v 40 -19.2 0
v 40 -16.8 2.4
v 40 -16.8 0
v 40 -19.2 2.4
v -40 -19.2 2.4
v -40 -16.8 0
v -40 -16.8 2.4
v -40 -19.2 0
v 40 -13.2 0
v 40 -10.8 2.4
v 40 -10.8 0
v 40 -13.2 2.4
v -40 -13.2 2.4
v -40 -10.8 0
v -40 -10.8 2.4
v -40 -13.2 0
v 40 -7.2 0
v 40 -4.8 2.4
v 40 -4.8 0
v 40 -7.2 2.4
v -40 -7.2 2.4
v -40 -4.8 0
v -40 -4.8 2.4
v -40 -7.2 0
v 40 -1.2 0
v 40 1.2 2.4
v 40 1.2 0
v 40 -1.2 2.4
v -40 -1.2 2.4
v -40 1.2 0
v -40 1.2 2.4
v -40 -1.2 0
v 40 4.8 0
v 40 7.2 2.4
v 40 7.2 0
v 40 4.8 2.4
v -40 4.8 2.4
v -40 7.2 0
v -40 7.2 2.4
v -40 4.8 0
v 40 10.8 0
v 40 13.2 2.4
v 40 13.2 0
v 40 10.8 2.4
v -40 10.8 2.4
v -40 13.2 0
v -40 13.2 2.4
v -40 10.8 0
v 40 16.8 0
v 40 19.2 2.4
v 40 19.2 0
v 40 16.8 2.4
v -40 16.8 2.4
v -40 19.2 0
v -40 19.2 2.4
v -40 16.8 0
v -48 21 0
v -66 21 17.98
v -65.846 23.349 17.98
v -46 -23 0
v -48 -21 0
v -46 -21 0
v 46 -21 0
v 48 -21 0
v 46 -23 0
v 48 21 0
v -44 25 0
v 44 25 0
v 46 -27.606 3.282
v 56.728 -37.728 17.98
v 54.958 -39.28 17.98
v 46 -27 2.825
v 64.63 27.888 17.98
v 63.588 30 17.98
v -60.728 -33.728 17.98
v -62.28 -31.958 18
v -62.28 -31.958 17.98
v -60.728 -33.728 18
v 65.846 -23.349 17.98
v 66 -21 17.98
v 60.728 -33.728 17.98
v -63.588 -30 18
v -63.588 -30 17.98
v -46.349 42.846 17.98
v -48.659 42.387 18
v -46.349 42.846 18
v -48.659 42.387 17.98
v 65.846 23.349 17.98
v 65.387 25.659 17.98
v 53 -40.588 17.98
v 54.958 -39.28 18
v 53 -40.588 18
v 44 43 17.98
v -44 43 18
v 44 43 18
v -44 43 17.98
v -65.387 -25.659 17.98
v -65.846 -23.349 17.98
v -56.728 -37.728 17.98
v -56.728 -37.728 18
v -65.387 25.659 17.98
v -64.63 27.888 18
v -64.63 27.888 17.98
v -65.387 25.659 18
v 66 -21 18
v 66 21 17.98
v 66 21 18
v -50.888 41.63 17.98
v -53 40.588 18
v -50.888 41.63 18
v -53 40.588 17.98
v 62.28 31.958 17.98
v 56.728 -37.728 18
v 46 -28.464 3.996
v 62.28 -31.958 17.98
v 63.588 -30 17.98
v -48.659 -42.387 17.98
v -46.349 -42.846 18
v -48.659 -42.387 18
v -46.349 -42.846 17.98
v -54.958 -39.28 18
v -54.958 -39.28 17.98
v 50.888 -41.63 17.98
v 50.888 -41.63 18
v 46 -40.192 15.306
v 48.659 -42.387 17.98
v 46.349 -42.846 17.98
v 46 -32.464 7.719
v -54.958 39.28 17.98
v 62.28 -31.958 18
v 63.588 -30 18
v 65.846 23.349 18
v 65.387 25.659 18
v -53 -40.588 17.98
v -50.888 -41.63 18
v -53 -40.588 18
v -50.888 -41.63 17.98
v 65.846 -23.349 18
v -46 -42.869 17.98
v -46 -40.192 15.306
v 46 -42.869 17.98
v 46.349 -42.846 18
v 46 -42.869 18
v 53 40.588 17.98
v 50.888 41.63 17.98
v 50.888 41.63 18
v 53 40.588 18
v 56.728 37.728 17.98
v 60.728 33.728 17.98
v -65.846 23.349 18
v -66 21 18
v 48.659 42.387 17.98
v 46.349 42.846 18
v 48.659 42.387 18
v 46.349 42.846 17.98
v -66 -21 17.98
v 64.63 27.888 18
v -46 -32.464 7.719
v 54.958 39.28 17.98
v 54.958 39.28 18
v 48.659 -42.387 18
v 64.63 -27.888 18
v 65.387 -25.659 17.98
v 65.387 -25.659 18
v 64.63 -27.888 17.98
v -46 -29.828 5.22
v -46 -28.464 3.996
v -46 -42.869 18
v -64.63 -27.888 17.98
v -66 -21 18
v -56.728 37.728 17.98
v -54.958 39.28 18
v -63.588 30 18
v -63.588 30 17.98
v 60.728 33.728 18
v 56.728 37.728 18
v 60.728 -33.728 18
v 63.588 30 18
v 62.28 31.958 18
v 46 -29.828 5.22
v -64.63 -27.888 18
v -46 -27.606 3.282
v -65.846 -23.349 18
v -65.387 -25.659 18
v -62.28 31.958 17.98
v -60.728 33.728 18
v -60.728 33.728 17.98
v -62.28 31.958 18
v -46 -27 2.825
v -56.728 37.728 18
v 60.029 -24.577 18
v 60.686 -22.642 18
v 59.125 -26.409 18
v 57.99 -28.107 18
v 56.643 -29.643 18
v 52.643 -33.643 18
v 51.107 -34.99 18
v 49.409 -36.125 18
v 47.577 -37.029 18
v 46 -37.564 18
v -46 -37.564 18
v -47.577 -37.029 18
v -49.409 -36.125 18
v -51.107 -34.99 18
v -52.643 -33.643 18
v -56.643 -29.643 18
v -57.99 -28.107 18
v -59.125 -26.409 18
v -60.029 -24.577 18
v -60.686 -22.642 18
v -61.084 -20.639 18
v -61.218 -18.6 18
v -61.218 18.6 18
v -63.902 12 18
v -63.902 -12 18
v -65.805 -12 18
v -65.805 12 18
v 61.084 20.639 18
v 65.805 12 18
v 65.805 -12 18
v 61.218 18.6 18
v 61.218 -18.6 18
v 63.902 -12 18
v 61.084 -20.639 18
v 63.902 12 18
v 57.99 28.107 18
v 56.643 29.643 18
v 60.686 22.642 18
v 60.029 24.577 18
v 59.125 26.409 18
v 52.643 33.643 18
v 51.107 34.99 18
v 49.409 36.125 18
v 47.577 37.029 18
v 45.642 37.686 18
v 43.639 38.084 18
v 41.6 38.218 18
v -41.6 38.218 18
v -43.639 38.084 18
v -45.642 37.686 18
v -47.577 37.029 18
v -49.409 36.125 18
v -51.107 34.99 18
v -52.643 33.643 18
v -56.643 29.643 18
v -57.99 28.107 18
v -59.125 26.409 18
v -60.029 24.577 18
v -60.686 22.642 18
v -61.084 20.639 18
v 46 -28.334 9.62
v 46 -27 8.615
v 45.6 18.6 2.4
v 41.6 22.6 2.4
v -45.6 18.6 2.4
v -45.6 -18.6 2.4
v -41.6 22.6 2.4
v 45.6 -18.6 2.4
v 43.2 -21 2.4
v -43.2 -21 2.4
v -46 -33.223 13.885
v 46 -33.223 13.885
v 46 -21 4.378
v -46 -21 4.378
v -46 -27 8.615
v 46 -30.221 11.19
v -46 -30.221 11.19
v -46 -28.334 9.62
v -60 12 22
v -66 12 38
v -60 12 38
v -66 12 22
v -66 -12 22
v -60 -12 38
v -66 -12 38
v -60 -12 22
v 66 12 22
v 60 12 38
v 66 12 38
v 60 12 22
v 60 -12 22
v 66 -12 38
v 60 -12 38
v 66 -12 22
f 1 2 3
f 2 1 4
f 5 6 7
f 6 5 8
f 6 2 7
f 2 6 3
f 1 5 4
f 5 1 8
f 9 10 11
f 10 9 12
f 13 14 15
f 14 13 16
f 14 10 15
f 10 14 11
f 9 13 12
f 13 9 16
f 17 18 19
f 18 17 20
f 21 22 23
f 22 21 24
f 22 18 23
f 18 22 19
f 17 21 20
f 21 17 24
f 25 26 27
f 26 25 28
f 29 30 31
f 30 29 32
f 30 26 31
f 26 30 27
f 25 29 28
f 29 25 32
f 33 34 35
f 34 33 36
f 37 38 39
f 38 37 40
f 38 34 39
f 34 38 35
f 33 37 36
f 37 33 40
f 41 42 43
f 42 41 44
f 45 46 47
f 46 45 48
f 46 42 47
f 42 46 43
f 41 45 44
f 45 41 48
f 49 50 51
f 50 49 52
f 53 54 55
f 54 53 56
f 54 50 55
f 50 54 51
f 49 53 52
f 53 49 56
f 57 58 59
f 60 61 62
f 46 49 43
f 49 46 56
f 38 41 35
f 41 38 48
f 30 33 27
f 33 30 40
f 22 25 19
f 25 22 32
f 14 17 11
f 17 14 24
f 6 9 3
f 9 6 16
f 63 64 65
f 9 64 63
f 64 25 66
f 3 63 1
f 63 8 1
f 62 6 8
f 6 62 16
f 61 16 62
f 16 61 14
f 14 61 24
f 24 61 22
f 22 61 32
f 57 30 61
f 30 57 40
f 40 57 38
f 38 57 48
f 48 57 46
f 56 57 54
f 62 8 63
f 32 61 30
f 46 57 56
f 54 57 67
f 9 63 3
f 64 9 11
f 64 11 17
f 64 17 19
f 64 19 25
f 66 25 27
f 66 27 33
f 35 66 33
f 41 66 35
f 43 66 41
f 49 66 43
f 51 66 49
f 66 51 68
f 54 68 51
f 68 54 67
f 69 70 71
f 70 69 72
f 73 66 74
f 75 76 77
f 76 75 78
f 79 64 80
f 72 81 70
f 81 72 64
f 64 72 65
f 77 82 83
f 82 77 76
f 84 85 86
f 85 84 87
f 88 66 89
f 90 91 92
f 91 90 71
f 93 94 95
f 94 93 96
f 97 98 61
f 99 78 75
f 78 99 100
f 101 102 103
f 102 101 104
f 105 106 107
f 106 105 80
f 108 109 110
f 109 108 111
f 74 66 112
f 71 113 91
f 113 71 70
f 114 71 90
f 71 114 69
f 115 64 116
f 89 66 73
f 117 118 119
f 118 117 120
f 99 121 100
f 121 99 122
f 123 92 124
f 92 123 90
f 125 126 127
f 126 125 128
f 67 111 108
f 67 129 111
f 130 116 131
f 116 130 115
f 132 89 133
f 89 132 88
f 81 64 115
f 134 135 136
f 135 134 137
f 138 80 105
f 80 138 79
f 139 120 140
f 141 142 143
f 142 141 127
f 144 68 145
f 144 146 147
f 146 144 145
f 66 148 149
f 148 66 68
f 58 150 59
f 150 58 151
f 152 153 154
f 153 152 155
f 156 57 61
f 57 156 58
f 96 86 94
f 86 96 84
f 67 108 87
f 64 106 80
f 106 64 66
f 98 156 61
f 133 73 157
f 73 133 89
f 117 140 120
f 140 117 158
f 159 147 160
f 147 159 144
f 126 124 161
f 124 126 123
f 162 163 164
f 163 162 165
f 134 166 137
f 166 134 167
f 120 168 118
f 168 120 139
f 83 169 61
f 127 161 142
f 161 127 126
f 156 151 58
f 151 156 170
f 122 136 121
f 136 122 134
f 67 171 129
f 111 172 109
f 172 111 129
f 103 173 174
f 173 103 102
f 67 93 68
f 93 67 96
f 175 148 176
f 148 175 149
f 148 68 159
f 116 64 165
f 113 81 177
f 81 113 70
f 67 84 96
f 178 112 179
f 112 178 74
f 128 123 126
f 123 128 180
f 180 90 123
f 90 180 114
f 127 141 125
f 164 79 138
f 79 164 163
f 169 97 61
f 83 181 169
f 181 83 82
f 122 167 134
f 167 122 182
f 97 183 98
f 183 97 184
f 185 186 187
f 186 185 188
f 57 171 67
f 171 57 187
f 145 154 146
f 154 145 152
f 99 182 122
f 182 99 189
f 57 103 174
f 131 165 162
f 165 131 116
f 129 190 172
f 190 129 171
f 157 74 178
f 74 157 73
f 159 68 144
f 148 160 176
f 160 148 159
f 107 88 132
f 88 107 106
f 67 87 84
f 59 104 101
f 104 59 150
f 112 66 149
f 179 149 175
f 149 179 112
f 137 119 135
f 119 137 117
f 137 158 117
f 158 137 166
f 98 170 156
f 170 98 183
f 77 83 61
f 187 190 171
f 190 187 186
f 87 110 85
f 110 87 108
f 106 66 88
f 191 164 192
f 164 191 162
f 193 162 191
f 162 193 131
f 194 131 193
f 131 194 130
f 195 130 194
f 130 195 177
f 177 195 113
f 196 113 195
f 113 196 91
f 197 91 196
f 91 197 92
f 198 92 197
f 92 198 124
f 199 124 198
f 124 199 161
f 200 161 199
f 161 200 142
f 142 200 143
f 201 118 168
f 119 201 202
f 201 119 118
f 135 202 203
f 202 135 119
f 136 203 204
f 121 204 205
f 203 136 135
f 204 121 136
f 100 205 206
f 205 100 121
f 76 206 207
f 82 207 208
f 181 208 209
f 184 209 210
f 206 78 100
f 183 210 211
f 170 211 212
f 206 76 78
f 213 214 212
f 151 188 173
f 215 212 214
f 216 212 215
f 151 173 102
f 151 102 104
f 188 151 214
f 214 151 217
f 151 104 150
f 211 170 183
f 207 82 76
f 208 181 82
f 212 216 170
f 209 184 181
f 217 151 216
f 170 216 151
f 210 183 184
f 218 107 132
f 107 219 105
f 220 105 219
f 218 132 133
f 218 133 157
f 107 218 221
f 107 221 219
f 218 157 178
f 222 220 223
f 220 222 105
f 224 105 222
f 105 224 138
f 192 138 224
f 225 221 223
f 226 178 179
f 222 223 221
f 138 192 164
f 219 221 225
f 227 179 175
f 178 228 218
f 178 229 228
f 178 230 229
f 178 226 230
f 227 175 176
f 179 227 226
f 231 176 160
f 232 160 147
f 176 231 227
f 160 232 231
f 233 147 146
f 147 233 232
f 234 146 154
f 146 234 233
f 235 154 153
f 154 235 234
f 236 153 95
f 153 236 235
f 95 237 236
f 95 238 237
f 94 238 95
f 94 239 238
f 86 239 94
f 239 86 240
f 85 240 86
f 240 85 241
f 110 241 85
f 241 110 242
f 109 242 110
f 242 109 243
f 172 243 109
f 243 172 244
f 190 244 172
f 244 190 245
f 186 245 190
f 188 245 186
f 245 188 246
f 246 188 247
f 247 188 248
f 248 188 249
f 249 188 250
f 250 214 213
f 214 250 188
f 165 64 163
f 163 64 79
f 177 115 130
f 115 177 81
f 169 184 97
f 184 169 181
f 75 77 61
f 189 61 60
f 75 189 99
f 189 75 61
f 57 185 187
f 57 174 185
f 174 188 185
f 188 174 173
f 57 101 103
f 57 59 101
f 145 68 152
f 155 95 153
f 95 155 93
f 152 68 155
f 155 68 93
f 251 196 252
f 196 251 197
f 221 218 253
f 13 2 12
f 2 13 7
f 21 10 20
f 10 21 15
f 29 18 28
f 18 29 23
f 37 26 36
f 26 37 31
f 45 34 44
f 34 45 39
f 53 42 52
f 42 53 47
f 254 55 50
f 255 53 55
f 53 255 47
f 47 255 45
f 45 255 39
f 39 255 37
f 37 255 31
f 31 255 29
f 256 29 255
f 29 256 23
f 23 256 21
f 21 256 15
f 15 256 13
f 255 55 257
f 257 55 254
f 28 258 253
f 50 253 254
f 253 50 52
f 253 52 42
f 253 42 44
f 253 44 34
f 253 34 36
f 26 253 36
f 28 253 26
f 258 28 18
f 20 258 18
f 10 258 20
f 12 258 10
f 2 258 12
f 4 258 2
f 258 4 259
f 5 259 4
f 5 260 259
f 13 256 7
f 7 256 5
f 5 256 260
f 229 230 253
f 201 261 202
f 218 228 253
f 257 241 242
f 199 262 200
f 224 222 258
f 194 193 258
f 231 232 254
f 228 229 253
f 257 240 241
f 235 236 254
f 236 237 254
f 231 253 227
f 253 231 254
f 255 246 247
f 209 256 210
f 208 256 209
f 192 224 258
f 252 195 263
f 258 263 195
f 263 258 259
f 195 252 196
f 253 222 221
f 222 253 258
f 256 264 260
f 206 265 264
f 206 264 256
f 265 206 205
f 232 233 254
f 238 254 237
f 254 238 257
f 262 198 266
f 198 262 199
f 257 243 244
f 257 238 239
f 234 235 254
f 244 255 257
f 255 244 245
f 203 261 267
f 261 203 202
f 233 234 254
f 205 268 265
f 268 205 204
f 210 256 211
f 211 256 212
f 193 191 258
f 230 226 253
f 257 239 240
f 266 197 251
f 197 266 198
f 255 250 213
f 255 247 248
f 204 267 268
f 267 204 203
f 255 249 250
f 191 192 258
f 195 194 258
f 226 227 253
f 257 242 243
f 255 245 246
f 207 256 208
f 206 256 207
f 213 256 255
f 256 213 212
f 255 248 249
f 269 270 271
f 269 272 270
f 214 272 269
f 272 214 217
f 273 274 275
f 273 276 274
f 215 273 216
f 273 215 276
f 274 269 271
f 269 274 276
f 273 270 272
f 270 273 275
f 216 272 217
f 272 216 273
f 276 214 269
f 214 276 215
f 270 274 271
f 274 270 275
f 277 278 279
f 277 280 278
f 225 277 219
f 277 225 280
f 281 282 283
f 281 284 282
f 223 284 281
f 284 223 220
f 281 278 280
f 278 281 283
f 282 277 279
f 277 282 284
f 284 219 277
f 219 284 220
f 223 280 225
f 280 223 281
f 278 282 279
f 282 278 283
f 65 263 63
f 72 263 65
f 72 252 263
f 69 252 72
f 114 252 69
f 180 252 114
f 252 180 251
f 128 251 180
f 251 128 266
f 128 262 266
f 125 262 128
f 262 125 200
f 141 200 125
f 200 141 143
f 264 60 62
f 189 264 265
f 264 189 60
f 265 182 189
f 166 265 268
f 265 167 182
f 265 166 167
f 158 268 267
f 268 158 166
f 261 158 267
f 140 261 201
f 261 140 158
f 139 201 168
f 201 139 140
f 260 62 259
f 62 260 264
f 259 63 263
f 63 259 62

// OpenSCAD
// R3.2 matched CAD prototype, mm. Geometry checked; see separate slice report. Not physically tested.
// Upright print orientation. The basket front is OPEN for watering cloth.
// Direct robot pickup from the printer plate is assumed; no plate hardware.
part="basket";
$fn=48; eps=.02;
basket_z=35; cloth_t=2; grow_pad_t=3;
retainer_z=basket_z+2.4+cloth_t+grow_pad_t; // 42.4 mm
module rect2(w,d,c=4){polygon([[-w/2+c,-d/2],[w/2-c,-d/2],[w/2,-d/2+c],[w/2,d/2-c],[w/2-c,d/2],[-w/2+c,d/2],[-w/2,d/2-c],[-w/2,-d/2+c]]);}
module slab(w,d,h,c=4){linear_extrude(h)rect2(w,d,c);}
module taper(w0,d0,w1,d1,h){hull(){slab(w0,d0,eps);translate([0,0,h-eps])linear_extrude(eps)offset(r=(w1-w0)/2)rect2(w0,d0);}}
module reservoir(){
 union(){
  difference(){slab(128,82,45);translate([0,0,2])slab(122,76,45,3);}
  for(s=[-1,1])translate([s*66.9-3.1,-12,0])cube([6.2,24,16]);
  // Permanent integral basket rests. These are NOT removable print supports.
  for(x=[-35,0,35])translate([x-2,-16,1.9])cube([4,32,basket_z-1.9]);
 }
}
module basket_body(){
 union(){
  difference(){
   taper(96,50,132,86,18);
   translate([0,0,2.4])taper(91.2,45.2,126.4,80.4,17.6);
   for(y=[-18,-12,-6,0,6,12,18])translate([-40,y-1.2,-.1])cube([80,2.4,2.6]);
  }
  for(s=[-1,1])scale([s,1,1]){
   hull(){translate([64,-12,17.9])cube([1.8,24,.1]);translate([60,-12,22])cube([6,24,.1]);}
   translate([60,-12,22])cube([6,24,16]);
  }
 }
}
module basket(){difference(){
 basket_body();
 // 92 mm clear width for 88 mm cloth, 2 mm clearance on each side.
 // Open to the top; cut reaches the edge of the mat platform at Y=-21.
 translate([-46,-60,-.1])cube([92,39,60]);
}}
module retainer_base(){polygon([[-41.6,-22.6],[41.6,-22.6],[45.6,-18.6],[45.6,18.6],[41.6,22.6],[-41.6,22.6],[-45.6,18.6],[-45.6,-18.6]]);}
module retainer_profile(r){offset(r=r)retainer_base();}
module retainer_taper(r0,r1,h){hull(){linear_extrude(eps)retainer_profile(r0);translate([0,0,h-eps])linear_extrude(eps)retainer_profile(r1);}}
module retainer(){union(){
 difference(){retainer_taper(4.7,6.28,1.6);translate([0,0,-.1])retainer_taper(3.4,5.18,1.8);}
 for(s=[-1,1])scale([s,1,1])translate([42,-4,0])cube([8.2,8,.8]);
 for(s=[-1,1])scale([1,s,1])translate([-4,19,0])cube([8,8.2,.8]);
}}
module assembly(){reservoir();translate([0,0,basket_z])basket();translate([0,0,retainer_z])retainer();}
module plate(){translate([110,167,0])reservoir();translate([76,53,0])basket();translate([181,61.9,0])rotate([0,0,90])retainer();}
if(part=="reservoir")reservoir();
if(part=="basket")basket();
if(part=="retainer")retainer();
if(part=="assembly")assembly();
if(part=="plate")plate();
